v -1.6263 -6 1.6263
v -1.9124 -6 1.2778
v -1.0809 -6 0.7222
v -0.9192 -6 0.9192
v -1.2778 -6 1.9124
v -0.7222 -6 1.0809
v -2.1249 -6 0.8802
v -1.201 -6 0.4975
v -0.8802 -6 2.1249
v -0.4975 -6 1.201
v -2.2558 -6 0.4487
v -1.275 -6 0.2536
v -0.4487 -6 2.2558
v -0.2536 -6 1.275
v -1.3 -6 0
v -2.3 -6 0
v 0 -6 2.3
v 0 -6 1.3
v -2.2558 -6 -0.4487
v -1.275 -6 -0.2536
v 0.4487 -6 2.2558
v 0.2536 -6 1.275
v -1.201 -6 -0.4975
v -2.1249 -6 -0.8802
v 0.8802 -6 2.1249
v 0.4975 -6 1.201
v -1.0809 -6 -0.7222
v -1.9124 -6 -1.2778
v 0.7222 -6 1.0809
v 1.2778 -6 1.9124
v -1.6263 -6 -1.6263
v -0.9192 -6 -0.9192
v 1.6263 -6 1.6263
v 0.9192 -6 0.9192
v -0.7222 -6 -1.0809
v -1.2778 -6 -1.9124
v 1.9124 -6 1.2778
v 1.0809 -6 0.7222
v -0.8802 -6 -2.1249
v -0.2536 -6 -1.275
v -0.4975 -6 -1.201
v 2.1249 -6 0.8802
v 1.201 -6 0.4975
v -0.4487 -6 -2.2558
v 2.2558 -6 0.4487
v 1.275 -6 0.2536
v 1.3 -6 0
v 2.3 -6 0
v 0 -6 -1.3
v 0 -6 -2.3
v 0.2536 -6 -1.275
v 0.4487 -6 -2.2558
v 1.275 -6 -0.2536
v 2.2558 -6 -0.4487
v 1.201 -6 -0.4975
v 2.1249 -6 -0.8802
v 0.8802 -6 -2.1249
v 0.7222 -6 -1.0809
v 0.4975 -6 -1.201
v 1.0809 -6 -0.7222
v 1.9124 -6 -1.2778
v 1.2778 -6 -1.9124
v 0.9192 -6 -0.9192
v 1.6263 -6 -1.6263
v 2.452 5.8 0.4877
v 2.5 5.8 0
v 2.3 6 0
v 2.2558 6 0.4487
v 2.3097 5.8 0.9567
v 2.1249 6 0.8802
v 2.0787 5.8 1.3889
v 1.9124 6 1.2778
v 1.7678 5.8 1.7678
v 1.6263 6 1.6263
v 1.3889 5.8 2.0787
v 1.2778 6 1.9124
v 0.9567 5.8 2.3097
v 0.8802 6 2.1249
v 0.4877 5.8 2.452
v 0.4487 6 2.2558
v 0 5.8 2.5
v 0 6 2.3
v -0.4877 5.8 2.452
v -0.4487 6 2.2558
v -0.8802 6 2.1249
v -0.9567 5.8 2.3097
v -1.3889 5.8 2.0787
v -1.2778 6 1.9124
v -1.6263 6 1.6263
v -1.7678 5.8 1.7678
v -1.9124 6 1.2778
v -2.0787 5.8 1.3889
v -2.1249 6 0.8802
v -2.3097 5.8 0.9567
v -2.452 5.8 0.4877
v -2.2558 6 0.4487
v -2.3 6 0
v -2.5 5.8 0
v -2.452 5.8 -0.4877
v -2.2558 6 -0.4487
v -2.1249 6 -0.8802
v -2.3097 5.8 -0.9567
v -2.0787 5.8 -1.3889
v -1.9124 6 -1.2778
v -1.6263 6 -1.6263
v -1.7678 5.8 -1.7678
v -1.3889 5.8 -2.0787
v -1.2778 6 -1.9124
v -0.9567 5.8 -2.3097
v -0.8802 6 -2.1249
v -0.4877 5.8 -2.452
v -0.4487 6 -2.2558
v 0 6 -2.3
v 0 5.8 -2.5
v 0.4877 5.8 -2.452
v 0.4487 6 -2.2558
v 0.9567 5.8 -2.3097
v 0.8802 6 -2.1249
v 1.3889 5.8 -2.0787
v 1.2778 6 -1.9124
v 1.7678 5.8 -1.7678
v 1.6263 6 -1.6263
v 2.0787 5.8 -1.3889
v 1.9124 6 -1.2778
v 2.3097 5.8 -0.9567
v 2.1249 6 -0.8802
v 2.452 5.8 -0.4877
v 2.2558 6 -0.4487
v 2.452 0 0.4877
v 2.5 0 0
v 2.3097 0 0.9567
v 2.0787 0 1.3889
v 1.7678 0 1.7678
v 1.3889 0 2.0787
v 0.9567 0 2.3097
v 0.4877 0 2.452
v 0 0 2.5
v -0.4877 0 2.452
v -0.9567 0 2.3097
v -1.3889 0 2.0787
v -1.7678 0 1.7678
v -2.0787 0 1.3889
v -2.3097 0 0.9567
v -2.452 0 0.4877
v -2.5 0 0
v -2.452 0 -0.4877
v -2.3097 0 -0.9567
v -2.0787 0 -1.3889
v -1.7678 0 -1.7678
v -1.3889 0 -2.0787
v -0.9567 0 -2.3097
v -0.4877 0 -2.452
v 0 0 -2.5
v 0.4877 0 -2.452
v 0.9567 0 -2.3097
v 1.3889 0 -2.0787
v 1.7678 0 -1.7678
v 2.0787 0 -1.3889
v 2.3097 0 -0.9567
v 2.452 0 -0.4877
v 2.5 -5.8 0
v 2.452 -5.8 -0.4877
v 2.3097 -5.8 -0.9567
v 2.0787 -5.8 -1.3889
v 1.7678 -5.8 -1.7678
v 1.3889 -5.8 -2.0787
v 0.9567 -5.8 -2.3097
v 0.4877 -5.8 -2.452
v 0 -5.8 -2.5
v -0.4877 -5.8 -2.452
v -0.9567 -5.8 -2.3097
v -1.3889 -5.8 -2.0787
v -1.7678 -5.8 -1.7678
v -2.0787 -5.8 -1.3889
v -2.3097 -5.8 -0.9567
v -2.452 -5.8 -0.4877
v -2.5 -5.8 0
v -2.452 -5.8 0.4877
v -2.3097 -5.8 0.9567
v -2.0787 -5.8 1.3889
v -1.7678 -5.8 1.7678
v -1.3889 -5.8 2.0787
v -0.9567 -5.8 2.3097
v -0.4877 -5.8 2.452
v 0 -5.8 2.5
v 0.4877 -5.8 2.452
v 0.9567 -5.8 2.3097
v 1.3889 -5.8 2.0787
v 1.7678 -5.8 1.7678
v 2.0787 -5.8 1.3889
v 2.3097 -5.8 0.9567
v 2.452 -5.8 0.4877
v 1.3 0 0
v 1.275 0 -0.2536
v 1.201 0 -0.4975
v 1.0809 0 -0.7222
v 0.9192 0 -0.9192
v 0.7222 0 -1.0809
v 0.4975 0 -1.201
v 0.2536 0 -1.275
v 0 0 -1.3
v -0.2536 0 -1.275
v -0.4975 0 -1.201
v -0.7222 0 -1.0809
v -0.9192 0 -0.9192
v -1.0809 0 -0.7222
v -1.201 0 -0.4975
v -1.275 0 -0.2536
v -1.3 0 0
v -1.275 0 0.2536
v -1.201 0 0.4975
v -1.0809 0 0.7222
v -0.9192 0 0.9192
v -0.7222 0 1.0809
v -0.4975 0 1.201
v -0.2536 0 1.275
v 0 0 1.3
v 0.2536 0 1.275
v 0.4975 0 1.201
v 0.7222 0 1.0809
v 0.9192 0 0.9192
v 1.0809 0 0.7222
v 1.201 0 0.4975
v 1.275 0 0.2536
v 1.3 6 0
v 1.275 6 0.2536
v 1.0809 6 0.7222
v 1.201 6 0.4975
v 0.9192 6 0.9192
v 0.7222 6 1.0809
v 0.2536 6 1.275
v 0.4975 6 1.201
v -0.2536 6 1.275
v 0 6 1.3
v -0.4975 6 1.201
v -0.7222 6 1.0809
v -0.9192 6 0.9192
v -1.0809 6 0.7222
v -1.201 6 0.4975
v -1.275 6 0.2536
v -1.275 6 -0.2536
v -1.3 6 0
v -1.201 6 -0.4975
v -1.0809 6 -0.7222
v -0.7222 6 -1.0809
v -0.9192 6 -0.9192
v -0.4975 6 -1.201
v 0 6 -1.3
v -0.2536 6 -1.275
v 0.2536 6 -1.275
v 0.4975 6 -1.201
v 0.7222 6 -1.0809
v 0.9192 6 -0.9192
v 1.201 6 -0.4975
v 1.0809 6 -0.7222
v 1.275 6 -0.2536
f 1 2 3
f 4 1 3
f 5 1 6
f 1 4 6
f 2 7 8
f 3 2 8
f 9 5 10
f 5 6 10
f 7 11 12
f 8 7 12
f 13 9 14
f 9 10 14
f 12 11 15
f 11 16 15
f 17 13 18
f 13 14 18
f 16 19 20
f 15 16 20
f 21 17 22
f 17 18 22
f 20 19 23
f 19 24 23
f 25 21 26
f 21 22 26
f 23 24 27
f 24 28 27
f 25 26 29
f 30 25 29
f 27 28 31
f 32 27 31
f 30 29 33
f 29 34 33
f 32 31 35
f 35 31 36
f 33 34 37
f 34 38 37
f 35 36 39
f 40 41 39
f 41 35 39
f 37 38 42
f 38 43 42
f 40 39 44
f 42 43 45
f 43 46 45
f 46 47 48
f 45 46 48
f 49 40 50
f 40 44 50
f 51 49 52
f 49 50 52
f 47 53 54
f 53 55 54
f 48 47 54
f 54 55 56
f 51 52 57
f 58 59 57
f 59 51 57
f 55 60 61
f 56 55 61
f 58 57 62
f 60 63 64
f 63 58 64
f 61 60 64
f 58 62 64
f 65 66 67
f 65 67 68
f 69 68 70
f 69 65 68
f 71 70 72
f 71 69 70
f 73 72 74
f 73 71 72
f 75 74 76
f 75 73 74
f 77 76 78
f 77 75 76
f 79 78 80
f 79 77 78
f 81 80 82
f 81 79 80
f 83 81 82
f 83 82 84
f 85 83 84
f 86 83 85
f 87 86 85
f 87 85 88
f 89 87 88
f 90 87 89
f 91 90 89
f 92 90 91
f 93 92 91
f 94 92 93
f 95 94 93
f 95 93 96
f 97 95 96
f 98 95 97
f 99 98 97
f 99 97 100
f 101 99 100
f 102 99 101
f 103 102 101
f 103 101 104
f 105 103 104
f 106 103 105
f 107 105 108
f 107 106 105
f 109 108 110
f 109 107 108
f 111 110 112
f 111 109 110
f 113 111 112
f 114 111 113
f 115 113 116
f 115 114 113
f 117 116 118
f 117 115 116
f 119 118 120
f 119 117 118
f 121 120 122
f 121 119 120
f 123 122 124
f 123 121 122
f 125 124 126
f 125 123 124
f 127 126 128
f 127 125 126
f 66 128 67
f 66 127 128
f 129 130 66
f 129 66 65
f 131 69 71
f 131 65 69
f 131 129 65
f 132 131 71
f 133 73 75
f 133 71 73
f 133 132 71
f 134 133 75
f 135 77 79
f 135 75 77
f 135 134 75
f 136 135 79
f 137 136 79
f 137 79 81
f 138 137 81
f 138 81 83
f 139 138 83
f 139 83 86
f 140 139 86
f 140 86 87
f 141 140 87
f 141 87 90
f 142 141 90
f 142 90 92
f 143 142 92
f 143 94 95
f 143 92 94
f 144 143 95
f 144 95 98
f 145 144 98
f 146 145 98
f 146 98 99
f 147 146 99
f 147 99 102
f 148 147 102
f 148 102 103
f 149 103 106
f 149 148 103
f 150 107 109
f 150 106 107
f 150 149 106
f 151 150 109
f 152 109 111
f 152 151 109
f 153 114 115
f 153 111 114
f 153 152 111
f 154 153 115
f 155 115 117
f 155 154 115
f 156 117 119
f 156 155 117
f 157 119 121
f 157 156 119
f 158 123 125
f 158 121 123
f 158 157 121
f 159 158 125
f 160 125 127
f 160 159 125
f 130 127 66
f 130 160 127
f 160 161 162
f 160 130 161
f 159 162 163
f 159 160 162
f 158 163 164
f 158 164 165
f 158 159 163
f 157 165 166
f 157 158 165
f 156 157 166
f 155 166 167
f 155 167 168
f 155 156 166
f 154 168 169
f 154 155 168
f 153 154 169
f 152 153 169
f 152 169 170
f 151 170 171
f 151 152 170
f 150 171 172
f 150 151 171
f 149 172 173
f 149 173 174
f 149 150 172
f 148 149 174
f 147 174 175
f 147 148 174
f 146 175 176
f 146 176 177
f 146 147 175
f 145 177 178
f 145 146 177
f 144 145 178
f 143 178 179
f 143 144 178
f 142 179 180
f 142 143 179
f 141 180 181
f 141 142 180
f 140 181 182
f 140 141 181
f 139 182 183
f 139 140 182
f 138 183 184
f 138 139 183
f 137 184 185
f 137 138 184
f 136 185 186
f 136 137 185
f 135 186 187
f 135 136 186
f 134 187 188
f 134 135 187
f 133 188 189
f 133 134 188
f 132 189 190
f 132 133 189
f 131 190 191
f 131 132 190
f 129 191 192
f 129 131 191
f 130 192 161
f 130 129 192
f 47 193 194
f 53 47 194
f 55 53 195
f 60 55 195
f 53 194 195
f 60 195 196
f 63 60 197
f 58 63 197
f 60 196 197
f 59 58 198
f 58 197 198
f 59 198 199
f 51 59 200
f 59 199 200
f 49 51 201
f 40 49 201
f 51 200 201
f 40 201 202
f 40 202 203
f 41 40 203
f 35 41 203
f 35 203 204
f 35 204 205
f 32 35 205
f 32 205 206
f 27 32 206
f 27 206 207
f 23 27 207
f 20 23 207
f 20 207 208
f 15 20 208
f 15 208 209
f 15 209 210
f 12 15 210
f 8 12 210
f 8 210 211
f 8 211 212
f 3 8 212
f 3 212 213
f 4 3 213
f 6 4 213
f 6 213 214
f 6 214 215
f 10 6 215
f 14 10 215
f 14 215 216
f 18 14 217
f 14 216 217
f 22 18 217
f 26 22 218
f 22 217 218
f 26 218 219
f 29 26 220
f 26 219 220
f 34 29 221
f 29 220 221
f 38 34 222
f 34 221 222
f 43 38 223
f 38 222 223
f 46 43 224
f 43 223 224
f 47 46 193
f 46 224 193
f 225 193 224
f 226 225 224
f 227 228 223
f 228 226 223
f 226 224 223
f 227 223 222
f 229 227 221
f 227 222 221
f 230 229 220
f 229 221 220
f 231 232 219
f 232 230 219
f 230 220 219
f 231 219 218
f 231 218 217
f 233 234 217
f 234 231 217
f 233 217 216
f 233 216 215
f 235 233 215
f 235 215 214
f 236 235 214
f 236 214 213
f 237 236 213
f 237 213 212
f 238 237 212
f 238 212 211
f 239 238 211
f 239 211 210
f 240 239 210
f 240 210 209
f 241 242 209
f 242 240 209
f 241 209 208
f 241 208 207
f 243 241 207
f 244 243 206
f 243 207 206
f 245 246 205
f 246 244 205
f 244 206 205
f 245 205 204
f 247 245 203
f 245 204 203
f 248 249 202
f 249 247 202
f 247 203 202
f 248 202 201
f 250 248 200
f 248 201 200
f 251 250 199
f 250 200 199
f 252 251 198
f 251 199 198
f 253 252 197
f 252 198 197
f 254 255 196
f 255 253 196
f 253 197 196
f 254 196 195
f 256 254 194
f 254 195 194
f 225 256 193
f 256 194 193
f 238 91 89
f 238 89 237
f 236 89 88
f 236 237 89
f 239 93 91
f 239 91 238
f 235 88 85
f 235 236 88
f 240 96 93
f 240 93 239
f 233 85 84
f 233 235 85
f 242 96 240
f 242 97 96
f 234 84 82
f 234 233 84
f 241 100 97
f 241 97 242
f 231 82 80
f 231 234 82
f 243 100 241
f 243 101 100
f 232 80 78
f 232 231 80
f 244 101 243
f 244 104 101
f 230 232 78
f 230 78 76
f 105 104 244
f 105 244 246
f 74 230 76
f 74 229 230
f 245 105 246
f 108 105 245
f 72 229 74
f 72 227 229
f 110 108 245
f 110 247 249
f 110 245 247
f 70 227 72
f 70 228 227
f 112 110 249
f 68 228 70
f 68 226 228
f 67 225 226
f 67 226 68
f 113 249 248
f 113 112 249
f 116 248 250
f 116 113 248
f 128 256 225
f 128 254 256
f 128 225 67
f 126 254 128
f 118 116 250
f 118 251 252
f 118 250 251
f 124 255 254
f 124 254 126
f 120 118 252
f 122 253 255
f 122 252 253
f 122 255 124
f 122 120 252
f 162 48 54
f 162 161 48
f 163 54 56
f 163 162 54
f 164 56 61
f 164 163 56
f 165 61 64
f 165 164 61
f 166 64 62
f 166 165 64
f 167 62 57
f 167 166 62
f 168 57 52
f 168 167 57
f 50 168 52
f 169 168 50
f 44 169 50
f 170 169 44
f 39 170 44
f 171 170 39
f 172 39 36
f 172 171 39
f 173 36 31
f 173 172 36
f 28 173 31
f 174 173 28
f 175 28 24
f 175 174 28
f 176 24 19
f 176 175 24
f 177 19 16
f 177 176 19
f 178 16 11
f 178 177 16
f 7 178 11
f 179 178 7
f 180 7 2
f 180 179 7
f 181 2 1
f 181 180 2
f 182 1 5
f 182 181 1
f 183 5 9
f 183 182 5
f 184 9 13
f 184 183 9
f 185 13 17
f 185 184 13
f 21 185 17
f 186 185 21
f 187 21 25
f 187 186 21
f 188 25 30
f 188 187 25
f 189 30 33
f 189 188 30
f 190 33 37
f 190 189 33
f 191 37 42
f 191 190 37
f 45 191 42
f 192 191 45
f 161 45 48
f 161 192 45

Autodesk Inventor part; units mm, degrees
ref_plane "YZ Plane" through (0, 0, 0) normal (1, 0, 0) x (0, 1, 0)
ref_plane "XZ Plane" through (0, 0, 0) normal (0, 1, 0) x (-1, 0, 0)
ref_plane "XY Plane" through (0, 0, 0) normal (0, 0, 1) x (1, 0, 0)
sketch "スケッチ1" plane through (0, 0, 0) normal (0, 1, 0) x (1, 0, 0)
  circle A0 centre (0, 0) radius 2.5
  circle A1 centre (0, 0) radius 1.3
  dimension "d0" = 5
  dimension "d1" = 2.6
extrude "押し出し1" add sketch "スケッチ1" along normal mid plane 12
chamfer "面取り1" distance 0.2 angle 45 2 edges at (-2.5, 6, 0) (-2.5, -6, 0)
properties part number "ARL-2612E"
